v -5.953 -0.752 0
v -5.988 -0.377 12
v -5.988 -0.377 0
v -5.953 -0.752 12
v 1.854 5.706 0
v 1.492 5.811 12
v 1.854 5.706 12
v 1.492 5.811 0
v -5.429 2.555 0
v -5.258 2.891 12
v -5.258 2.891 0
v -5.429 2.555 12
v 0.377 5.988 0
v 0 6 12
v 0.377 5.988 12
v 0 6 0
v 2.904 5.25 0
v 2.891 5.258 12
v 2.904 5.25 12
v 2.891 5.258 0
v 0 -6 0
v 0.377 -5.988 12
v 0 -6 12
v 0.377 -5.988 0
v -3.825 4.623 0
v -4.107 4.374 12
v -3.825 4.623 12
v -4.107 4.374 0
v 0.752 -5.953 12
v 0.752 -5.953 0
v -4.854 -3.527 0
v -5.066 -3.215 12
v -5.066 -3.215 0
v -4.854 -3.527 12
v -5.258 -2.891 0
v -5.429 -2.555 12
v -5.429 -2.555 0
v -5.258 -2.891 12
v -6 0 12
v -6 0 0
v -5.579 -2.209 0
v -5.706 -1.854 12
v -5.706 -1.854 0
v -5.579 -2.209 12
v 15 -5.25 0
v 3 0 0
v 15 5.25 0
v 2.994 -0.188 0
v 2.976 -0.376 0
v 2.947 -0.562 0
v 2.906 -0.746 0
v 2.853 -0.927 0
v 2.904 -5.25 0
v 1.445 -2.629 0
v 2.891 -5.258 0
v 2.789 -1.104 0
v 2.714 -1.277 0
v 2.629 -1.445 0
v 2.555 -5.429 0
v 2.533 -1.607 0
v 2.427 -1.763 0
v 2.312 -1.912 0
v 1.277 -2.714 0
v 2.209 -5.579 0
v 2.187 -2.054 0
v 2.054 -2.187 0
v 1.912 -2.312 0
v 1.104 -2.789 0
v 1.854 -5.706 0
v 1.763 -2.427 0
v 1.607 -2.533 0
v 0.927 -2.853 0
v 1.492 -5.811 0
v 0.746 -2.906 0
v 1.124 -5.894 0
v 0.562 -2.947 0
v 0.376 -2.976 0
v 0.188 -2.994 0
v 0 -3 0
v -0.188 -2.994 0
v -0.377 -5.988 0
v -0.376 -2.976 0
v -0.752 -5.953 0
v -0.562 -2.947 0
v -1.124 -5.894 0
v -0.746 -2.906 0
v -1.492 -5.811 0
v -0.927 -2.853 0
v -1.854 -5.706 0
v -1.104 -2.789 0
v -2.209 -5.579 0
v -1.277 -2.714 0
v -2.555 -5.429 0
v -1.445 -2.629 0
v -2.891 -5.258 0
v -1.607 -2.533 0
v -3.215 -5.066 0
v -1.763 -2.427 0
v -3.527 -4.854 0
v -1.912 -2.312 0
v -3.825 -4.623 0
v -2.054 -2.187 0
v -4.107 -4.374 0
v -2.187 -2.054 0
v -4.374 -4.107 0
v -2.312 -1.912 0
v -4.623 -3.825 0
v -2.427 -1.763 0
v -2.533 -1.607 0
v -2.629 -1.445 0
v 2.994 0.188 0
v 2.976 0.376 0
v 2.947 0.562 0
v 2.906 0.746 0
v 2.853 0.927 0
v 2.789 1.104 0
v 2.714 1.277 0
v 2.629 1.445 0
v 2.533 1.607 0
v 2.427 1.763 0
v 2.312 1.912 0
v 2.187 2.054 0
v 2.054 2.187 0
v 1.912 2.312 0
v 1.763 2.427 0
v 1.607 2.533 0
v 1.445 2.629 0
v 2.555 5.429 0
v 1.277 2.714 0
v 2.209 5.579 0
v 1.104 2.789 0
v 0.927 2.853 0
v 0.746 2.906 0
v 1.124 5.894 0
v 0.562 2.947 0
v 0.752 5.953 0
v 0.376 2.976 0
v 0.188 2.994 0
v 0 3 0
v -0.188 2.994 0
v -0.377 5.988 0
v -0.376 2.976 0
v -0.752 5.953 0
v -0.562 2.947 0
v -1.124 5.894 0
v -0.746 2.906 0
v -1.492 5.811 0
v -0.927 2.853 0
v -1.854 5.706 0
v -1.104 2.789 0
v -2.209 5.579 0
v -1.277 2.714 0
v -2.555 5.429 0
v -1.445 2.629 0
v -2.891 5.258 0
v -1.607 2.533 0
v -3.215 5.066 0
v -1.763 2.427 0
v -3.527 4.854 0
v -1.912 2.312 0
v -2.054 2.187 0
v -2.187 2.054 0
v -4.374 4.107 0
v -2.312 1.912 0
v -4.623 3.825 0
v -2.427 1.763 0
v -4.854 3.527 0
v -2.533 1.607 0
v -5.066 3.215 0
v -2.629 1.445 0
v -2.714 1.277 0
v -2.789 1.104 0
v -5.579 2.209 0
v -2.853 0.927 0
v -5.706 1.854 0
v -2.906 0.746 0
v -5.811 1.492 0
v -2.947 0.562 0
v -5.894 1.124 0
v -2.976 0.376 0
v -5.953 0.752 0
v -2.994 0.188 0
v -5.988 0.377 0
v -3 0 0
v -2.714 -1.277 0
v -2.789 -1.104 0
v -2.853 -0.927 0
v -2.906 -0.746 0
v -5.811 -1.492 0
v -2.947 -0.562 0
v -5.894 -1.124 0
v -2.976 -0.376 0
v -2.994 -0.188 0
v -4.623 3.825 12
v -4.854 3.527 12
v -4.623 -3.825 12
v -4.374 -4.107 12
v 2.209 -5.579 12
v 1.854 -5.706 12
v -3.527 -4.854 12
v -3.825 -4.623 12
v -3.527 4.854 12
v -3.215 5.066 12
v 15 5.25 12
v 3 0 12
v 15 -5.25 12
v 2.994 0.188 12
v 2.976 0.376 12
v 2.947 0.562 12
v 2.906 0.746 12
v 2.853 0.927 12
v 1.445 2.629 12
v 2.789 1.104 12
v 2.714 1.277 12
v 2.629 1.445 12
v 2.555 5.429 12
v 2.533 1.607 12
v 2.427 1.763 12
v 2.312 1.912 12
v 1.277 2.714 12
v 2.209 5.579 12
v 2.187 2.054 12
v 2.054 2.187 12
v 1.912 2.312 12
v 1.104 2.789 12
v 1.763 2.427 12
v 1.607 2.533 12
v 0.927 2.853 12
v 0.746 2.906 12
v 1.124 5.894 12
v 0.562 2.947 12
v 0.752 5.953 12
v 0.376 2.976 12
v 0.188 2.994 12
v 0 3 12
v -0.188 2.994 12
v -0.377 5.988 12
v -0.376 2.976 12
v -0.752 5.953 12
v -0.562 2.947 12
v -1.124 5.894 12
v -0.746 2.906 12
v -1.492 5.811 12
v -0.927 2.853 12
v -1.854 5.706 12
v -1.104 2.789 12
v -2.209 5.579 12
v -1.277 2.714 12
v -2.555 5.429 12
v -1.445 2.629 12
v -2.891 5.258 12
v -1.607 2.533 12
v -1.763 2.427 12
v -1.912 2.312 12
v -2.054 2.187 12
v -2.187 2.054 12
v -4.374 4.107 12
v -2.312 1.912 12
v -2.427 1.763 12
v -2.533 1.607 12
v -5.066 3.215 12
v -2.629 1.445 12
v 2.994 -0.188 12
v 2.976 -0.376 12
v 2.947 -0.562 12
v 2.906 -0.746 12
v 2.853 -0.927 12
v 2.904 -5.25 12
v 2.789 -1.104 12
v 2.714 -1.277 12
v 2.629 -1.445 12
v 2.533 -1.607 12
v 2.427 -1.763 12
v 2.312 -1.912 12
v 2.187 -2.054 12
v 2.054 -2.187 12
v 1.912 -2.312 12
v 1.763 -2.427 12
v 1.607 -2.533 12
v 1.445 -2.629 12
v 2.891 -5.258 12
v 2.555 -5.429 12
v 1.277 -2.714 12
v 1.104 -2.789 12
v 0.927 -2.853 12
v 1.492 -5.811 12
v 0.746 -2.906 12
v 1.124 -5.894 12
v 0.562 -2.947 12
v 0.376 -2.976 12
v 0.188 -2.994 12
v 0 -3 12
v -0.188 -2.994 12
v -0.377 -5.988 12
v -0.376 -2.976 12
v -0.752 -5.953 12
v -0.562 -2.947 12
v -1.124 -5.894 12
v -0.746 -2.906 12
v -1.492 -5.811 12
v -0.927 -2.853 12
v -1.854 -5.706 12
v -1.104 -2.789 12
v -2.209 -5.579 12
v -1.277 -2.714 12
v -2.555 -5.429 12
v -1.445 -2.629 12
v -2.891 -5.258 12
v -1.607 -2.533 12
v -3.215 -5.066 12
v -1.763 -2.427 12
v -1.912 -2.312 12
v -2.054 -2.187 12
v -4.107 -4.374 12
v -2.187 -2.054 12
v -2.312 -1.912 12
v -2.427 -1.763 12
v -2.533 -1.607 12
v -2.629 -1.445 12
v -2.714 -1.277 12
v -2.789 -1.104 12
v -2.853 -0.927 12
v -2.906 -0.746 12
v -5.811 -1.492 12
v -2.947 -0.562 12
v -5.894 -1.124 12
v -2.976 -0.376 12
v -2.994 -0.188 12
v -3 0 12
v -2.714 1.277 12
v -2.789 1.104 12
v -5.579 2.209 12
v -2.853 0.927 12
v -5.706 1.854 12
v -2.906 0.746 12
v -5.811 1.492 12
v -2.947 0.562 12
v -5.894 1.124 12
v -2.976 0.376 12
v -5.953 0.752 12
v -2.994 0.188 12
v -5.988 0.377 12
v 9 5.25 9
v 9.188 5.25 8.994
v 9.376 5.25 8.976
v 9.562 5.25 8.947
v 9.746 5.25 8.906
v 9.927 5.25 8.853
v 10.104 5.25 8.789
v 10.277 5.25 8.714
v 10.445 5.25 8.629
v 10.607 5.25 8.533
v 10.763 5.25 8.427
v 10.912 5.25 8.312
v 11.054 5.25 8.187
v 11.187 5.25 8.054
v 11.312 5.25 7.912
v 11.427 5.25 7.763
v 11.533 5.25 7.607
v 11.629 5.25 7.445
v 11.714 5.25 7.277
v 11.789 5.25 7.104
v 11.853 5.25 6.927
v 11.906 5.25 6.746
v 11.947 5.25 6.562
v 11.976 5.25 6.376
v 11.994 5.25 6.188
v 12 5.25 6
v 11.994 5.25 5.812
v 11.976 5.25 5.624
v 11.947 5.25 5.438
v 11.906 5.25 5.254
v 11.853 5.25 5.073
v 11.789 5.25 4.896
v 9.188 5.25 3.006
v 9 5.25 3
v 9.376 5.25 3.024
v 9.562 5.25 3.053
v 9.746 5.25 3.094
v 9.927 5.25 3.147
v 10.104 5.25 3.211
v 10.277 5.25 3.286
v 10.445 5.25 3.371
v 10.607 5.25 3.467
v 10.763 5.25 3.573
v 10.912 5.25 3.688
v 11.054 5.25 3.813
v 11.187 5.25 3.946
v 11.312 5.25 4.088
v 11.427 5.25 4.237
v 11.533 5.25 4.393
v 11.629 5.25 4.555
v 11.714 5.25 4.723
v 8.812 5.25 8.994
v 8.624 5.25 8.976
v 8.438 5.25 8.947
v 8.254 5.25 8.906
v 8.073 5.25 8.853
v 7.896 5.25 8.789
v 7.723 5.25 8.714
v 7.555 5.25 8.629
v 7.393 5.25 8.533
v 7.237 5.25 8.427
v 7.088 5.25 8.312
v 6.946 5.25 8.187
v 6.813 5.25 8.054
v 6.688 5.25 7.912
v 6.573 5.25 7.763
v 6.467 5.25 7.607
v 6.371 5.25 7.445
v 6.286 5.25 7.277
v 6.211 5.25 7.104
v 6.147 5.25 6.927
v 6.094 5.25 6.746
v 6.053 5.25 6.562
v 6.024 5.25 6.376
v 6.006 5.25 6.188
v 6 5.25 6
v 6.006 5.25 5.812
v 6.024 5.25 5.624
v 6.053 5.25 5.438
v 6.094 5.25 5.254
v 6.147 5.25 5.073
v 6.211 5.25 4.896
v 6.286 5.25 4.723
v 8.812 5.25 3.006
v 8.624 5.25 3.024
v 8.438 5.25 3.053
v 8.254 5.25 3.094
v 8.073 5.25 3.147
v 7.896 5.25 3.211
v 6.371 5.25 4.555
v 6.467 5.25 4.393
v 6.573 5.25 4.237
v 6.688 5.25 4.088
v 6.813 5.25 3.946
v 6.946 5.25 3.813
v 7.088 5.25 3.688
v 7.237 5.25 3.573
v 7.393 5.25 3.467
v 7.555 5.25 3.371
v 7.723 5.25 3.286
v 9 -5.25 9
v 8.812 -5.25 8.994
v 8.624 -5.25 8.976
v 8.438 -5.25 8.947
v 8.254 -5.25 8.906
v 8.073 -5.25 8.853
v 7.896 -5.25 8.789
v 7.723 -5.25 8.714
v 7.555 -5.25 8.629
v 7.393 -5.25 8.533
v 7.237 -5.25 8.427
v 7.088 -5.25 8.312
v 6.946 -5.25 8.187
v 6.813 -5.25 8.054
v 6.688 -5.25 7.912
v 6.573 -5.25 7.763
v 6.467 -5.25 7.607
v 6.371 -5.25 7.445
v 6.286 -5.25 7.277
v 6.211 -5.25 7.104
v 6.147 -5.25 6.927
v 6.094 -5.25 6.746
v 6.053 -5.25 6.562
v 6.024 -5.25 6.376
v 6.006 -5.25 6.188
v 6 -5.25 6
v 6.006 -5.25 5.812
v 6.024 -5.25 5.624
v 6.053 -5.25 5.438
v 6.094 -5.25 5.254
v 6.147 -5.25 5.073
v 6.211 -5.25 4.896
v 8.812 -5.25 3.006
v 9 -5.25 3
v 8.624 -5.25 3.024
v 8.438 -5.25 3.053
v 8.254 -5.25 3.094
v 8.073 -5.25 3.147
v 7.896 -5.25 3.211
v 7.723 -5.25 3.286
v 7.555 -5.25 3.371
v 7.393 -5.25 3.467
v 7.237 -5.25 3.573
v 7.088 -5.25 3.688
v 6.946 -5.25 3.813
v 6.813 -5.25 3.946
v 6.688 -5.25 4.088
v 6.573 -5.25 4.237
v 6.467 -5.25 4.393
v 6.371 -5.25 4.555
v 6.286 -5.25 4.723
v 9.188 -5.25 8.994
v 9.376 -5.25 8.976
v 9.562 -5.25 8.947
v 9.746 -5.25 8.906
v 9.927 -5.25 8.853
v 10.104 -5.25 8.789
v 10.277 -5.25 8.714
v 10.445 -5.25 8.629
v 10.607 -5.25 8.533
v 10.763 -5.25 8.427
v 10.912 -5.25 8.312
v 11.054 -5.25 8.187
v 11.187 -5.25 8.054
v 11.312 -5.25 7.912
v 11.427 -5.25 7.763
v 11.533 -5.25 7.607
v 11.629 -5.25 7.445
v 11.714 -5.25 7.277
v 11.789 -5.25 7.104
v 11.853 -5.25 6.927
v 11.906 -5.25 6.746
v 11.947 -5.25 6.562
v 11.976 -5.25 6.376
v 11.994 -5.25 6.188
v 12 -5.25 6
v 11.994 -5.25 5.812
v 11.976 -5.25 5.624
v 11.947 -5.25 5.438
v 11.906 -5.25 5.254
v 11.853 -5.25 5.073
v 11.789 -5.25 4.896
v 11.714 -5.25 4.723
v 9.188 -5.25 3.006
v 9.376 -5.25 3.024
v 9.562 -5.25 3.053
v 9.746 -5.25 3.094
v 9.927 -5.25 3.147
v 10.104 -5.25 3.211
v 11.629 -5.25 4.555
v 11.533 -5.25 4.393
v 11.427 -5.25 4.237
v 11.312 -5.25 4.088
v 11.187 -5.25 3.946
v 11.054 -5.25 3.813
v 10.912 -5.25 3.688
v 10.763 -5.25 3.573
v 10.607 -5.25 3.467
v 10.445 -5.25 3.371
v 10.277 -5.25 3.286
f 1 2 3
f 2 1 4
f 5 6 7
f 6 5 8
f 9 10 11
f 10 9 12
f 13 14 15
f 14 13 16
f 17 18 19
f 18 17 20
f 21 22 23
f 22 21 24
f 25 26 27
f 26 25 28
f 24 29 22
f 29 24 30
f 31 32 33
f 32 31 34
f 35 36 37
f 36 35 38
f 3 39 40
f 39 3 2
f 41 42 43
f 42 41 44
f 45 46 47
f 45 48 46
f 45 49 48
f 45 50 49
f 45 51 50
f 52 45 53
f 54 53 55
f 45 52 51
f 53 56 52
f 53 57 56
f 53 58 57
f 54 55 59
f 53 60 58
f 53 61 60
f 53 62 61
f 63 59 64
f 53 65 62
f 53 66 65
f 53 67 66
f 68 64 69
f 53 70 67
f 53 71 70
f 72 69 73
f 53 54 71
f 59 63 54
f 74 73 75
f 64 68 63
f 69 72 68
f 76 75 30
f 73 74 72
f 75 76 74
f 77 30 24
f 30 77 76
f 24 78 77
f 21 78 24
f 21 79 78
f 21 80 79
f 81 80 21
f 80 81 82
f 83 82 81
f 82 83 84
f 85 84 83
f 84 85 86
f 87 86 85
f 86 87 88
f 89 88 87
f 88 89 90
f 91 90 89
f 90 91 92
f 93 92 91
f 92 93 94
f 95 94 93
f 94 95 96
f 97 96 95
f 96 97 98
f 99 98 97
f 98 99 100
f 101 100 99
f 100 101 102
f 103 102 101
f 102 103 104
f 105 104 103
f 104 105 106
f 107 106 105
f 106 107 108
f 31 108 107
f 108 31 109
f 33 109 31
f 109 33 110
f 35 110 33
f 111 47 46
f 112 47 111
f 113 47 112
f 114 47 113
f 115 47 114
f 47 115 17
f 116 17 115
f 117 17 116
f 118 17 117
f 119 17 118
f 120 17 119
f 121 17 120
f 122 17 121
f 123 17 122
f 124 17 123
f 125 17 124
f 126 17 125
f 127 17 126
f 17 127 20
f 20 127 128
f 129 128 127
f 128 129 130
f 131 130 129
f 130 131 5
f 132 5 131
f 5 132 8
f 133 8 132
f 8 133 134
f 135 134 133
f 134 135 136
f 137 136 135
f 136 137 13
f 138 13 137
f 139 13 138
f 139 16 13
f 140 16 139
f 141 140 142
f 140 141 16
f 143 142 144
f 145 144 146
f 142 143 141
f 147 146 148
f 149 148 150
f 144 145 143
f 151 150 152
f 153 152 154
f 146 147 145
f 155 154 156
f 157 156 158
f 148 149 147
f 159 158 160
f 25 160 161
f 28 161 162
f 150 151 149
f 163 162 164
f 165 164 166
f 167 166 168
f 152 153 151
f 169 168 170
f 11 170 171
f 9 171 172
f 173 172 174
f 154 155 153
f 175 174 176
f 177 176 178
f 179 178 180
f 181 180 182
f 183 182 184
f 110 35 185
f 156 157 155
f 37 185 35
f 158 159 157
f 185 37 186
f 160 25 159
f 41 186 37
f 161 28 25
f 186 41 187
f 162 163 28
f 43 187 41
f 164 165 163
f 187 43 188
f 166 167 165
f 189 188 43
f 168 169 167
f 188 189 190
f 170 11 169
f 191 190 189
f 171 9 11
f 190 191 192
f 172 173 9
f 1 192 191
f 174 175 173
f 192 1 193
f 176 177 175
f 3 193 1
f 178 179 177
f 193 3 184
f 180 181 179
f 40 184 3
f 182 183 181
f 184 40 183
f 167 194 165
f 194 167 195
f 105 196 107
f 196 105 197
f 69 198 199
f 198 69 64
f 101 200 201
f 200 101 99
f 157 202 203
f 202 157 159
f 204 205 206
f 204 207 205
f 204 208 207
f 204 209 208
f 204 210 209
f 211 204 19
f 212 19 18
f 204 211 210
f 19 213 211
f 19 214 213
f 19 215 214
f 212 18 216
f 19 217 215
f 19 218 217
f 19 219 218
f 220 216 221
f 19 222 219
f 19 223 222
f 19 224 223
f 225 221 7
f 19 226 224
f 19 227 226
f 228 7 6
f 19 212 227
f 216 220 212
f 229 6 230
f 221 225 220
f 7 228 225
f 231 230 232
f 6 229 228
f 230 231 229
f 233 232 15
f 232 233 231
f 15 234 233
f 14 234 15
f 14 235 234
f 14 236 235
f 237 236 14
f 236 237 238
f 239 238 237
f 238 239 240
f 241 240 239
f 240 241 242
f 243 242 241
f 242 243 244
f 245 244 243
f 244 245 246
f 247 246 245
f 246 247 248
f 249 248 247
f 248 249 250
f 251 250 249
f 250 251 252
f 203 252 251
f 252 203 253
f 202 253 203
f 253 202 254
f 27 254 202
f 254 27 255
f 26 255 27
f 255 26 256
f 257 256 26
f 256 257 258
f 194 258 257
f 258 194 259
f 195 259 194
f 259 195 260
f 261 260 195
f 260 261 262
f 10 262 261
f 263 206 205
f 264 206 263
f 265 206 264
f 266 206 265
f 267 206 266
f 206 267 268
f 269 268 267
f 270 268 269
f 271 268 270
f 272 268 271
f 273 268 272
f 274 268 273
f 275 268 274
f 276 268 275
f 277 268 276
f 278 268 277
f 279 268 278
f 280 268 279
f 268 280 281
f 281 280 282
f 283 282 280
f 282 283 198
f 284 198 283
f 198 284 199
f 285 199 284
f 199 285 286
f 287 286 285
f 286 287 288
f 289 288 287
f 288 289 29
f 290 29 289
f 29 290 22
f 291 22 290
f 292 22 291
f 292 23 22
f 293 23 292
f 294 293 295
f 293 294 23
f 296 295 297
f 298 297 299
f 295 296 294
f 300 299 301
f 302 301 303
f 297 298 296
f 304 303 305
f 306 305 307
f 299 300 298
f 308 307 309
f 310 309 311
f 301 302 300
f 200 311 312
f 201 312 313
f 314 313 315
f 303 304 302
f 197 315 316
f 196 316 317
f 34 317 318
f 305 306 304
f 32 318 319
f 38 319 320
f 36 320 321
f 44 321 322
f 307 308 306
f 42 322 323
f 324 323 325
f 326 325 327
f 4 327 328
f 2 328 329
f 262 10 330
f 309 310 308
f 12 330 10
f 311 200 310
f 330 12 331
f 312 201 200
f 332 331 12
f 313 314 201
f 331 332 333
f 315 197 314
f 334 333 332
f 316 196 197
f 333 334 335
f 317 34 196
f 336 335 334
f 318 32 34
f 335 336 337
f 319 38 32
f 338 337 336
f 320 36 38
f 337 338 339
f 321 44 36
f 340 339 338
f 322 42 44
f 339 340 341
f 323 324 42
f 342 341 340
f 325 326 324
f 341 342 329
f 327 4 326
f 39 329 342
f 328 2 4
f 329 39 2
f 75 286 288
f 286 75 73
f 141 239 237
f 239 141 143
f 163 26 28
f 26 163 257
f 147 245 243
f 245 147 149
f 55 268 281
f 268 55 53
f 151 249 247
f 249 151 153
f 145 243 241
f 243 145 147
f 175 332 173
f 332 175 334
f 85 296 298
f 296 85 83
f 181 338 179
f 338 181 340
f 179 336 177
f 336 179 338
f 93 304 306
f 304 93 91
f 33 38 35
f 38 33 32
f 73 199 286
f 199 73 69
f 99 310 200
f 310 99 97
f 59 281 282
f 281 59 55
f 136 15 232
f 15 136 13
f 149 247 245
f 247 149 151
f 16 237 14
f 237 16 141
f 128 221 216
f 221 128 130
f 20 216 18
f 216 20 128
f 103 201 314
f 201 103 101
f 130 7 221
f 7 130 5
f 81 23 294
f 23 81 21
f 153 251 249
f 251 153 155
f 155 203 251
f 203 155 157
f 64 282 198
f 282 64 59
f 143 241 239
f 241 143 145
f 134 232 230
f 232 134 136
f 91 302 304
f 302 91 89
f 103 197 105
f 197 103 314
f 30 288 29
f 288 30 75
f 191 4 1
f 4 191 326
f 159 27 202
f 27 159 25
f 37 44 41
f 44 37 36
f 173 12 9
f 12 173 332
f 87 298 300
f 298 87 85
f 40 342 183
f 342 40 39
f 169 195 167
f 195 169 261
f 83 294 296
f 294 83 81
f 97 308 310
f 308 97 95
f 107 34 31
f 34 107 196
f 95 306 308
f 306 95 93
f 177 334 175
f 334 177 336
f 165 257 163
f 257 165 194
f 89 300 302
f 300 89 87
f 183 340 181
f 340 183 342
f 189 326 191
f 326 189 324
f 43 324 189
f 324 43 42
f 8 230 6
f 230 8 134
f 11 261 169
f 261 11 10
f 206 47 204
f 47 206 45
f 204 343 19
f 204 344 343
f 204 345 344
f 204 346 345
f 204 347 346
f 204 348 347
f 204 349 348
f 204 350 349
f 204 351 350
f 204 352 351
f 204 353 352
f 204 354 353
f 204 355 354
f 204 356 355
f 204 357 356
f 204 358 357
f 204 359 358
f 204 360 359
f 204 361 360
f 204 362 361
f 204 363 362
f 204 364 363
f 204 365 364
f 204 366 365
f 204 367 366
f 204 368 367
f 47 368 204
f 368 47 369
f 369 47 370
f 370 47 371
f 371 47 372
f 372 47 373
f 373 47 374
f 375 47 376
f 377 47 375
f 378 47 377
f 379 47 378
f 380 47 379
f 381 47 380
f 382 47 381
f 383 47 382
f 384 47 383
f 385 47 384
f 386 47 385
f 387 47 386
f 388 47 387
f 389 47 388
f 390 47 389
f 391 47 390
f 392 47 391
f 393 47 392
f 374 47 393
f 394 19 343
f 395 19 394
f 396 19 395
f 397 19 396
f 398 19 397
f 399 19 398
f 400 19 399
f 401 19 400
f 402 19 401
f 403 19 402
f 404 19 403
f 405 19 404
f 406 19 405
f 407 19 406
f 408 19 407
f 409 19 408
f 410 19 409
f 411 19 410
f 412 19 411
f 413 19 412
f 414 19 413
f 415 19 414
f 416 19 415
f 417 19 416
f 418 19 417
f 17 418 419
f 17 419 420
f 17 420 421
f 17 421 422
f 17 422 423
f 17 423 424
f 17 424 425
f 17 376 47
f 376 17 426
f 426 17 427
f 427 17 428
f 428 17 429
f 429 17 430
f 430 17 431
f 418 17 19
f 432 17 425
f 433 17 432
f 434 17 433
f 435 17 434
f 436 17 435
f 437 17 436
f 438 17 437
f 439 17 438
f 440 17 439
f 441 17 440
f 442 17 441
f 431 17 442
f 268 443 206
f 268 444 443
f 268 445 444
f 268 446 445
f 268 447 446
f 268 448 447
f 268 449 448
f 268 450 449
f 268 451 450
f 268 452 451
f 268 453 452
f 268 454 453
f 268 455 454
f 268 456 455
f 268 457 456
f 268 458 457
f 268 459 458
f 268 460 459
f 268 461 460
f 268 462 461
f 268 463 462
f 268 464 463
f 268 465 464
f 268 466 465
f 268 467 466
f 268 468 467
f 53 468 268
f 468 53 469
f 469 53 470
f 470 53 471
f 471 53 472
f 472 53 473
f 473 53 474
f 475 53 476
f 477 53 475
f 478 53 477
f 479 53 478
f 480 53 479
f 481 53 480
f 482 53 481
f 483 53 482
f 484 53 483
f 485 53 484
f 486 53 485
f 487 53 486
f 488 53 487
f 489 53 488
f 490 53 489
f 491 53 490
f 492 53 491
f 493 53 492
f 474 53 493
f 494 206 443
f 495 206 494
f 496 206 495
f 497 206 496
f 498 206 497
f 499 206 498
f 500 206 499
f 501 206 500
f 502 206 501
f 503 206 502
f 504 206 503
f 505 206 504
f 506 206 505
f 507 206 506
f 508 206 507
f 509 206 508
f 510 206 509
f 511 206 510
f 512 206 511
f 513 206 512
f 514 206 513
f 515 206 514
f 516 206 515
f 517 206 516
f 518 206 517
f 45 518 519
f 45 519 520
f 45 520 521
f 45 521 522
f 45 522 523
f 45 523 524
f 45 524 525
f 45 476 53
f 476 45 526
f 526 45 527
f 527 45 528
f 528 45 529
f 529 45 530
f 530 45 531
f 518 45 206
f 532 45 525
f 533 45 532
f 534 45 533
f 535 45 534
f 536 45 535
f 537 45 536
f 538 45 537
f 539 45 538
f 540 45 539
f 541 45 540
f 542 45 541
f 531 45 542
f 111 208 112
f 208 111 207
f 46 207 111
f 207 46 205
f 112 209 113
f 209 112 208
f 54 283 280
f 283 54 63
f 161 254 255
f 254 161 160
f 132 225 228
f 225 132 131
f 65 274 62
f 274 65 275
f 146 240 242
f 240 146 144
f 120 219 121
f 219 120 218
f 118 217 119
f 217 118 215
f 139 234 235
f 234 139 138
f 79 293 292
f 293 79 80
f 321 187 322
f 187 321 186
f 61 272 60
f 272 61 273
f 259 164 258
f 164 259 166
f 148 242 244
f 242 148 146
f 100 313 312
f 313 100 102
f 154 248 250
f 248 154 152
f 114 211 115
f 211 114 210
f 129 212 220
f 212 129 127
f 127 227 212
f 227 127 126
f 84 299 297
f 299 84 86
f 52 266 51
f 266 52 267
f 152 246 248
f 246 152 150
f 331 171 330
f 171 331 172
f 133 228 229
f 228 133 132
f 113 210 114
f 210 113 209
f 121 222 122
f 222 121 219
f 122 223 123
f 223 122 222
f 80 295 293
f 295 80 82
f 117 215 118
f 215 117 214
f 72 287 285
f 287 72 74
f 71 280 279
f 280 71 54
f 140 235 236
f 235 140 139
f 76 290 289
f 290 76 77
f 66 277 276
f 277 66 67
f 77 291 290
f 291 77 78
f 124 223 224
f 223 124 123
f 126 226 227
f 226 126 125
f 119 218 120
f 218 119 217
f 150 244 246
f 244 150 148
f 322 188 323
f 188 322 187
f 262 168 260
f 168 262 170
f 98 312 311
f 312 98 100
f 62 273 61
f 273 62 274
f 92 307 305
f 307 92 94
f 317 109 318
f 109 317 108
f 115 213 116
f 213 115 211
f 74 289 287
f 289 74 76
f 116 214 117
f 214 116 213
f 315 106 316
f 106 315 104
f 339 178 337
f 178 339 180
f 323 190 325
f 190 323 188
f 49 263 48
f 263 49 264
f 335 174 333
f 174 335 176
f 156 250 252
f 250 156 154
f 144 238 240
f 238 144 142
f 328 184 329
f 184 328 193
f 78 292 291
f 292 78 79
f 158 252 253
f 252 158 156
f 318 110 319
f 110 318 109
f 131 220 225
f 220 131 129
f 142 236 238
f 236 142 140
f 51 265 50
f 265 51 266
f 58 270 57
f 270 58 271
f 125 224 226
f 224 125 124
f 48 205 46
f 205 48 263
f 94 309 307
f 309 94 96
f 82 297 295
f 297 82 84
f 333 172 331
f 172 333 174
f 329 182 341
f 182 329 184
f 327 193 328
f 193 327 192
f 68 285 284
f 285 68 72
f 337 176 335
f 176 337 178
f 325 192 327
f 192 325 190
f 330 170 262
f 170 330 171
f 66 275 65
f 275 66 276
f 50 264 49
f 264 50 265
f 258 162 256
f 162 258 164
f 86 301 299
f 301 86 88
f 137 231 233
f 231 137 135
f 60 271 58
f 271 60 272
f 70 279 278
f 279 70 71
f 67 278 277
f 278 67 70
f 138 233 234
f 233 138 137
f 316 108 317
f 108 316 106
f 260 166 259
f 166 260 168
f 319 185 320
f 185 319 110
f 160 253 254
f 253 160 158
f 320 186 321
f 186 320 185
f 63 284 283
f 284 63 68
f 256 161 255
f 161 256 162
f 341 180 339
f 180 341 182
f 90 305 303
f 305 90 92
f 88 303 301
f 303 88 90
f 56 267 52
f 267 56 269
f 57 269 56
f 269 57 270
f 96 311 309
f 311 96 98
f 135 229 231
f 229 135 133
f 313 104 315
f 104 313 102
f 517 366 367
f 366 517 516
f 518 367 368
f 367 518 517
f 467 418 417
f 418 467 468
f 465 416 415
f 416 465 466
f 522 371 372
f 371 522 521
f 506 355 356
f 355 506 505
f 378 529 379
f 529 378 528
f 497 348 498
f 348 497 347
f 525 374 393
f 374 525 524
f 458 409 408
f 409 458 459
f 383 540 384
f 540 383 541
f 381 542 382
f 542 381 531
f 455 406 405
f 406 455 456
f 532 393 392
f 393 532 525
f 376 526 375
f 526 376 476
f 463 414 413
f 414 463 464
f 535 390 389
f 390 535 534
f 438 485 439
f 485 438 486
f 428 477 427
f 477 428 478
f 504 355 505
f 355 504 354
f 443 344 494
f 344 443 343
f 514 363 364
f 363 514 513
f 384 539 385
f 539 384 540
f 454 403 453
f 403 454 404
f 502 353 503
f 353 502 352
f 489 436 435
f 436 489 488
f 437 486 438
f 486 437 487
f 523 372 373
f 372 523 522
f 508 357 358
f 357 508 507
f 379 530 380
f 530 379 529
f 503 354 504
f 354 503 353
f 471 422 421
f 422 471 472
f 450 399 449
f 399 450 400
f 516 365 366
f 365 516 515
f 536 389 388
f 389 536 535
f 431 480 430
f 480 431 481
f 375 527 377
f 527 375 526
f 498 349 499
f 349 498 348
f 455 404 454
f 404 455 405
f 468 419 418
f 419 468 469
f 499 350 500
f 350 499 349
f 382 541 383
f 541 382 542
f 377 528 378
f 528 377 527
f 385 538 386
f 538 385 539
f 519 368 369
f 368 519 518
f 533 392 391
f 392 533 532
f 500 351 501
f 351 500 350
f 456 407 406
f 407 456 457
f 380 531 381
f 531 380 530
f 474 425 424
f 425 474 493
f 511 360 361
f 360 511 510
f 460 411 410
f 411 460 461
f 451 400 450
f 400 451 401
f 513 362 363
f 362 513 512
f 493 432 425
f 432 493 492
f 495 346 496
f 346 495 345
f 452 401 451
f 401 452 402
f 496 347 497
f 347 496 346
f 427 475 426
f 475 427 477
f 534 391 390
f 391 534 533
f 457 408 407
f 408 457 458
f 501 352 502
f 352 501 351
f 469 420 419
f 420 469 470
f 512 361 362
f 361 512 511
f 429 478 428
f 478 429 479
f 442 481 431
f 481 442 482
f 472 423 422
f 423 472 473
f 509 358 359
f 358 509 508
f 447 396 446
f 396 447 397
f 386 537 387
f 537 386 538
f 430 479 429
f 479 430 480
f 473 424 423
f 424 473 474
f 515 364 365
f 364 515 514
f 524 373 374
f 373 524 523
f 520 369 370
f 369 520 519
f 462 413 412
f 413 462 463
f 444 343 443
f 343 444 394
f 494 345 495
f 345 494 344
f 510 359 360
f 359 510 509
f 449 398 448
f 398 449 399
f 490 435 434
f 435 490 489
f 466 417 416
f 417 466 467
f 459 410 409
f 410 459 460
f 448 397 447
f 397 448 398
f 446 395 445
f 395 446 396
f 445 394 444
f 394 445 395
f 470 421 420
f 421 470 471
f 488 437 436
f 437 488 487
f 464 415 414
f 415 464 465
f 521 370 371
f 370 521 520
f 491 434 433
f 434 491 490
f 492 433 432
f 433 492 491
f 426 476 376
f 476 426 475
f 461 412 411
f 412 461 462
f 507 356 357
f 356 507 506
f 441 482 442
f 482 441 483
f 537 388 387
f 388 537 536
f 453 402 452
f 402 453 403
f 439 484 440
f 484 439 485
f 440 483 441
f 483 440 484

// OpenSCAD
// Bar clamp
// Used for joining two rods
// GNU GPL v3
// Maciej Urbański
// rooter@kyberian.net

inf = 9999;
$fn = 100;

module barclamp(rod_a_d, rod_b_d, t = 2, stiff = false) {
  h = rod_b_d + t * 2;
  clamp_ratio = 3 / 4;
  clamp_w = rod_a_d * clamp_ratio + t * 2;
  clamp_l = rod_b_d + t * 2;
  difference() {
    union() {
      cylinder(h = h, d = rod_a_d + 2 * t);
      translate([ 0, -clamp_w / 2, 0 ])
          cube([ rod_a_d / 2 + clamp_l, clamp_w, h ]);
    }
    translate([ 0, 0, -1 ]) union() {
      cylinder(h = h + 2, d = rod_a_d);
      if (!stiff) {
        translate([ 0, -rod_a_d * clamp_ratio / 2, 0 ])
            cube([ inf, rod_a_d * clamp_ratio, h + 2 ]);
      }
    }
    translate([ (rod_a_d + rod_b_d) / 2 + t, inf / 2, rod_b_d / 2 + t ])
        rotate([ 90, 0, 0 ]) cylinder(d = rod_b_d, h = inf);
  }
}

barclamp(6, 6, 3, stiff = true);
